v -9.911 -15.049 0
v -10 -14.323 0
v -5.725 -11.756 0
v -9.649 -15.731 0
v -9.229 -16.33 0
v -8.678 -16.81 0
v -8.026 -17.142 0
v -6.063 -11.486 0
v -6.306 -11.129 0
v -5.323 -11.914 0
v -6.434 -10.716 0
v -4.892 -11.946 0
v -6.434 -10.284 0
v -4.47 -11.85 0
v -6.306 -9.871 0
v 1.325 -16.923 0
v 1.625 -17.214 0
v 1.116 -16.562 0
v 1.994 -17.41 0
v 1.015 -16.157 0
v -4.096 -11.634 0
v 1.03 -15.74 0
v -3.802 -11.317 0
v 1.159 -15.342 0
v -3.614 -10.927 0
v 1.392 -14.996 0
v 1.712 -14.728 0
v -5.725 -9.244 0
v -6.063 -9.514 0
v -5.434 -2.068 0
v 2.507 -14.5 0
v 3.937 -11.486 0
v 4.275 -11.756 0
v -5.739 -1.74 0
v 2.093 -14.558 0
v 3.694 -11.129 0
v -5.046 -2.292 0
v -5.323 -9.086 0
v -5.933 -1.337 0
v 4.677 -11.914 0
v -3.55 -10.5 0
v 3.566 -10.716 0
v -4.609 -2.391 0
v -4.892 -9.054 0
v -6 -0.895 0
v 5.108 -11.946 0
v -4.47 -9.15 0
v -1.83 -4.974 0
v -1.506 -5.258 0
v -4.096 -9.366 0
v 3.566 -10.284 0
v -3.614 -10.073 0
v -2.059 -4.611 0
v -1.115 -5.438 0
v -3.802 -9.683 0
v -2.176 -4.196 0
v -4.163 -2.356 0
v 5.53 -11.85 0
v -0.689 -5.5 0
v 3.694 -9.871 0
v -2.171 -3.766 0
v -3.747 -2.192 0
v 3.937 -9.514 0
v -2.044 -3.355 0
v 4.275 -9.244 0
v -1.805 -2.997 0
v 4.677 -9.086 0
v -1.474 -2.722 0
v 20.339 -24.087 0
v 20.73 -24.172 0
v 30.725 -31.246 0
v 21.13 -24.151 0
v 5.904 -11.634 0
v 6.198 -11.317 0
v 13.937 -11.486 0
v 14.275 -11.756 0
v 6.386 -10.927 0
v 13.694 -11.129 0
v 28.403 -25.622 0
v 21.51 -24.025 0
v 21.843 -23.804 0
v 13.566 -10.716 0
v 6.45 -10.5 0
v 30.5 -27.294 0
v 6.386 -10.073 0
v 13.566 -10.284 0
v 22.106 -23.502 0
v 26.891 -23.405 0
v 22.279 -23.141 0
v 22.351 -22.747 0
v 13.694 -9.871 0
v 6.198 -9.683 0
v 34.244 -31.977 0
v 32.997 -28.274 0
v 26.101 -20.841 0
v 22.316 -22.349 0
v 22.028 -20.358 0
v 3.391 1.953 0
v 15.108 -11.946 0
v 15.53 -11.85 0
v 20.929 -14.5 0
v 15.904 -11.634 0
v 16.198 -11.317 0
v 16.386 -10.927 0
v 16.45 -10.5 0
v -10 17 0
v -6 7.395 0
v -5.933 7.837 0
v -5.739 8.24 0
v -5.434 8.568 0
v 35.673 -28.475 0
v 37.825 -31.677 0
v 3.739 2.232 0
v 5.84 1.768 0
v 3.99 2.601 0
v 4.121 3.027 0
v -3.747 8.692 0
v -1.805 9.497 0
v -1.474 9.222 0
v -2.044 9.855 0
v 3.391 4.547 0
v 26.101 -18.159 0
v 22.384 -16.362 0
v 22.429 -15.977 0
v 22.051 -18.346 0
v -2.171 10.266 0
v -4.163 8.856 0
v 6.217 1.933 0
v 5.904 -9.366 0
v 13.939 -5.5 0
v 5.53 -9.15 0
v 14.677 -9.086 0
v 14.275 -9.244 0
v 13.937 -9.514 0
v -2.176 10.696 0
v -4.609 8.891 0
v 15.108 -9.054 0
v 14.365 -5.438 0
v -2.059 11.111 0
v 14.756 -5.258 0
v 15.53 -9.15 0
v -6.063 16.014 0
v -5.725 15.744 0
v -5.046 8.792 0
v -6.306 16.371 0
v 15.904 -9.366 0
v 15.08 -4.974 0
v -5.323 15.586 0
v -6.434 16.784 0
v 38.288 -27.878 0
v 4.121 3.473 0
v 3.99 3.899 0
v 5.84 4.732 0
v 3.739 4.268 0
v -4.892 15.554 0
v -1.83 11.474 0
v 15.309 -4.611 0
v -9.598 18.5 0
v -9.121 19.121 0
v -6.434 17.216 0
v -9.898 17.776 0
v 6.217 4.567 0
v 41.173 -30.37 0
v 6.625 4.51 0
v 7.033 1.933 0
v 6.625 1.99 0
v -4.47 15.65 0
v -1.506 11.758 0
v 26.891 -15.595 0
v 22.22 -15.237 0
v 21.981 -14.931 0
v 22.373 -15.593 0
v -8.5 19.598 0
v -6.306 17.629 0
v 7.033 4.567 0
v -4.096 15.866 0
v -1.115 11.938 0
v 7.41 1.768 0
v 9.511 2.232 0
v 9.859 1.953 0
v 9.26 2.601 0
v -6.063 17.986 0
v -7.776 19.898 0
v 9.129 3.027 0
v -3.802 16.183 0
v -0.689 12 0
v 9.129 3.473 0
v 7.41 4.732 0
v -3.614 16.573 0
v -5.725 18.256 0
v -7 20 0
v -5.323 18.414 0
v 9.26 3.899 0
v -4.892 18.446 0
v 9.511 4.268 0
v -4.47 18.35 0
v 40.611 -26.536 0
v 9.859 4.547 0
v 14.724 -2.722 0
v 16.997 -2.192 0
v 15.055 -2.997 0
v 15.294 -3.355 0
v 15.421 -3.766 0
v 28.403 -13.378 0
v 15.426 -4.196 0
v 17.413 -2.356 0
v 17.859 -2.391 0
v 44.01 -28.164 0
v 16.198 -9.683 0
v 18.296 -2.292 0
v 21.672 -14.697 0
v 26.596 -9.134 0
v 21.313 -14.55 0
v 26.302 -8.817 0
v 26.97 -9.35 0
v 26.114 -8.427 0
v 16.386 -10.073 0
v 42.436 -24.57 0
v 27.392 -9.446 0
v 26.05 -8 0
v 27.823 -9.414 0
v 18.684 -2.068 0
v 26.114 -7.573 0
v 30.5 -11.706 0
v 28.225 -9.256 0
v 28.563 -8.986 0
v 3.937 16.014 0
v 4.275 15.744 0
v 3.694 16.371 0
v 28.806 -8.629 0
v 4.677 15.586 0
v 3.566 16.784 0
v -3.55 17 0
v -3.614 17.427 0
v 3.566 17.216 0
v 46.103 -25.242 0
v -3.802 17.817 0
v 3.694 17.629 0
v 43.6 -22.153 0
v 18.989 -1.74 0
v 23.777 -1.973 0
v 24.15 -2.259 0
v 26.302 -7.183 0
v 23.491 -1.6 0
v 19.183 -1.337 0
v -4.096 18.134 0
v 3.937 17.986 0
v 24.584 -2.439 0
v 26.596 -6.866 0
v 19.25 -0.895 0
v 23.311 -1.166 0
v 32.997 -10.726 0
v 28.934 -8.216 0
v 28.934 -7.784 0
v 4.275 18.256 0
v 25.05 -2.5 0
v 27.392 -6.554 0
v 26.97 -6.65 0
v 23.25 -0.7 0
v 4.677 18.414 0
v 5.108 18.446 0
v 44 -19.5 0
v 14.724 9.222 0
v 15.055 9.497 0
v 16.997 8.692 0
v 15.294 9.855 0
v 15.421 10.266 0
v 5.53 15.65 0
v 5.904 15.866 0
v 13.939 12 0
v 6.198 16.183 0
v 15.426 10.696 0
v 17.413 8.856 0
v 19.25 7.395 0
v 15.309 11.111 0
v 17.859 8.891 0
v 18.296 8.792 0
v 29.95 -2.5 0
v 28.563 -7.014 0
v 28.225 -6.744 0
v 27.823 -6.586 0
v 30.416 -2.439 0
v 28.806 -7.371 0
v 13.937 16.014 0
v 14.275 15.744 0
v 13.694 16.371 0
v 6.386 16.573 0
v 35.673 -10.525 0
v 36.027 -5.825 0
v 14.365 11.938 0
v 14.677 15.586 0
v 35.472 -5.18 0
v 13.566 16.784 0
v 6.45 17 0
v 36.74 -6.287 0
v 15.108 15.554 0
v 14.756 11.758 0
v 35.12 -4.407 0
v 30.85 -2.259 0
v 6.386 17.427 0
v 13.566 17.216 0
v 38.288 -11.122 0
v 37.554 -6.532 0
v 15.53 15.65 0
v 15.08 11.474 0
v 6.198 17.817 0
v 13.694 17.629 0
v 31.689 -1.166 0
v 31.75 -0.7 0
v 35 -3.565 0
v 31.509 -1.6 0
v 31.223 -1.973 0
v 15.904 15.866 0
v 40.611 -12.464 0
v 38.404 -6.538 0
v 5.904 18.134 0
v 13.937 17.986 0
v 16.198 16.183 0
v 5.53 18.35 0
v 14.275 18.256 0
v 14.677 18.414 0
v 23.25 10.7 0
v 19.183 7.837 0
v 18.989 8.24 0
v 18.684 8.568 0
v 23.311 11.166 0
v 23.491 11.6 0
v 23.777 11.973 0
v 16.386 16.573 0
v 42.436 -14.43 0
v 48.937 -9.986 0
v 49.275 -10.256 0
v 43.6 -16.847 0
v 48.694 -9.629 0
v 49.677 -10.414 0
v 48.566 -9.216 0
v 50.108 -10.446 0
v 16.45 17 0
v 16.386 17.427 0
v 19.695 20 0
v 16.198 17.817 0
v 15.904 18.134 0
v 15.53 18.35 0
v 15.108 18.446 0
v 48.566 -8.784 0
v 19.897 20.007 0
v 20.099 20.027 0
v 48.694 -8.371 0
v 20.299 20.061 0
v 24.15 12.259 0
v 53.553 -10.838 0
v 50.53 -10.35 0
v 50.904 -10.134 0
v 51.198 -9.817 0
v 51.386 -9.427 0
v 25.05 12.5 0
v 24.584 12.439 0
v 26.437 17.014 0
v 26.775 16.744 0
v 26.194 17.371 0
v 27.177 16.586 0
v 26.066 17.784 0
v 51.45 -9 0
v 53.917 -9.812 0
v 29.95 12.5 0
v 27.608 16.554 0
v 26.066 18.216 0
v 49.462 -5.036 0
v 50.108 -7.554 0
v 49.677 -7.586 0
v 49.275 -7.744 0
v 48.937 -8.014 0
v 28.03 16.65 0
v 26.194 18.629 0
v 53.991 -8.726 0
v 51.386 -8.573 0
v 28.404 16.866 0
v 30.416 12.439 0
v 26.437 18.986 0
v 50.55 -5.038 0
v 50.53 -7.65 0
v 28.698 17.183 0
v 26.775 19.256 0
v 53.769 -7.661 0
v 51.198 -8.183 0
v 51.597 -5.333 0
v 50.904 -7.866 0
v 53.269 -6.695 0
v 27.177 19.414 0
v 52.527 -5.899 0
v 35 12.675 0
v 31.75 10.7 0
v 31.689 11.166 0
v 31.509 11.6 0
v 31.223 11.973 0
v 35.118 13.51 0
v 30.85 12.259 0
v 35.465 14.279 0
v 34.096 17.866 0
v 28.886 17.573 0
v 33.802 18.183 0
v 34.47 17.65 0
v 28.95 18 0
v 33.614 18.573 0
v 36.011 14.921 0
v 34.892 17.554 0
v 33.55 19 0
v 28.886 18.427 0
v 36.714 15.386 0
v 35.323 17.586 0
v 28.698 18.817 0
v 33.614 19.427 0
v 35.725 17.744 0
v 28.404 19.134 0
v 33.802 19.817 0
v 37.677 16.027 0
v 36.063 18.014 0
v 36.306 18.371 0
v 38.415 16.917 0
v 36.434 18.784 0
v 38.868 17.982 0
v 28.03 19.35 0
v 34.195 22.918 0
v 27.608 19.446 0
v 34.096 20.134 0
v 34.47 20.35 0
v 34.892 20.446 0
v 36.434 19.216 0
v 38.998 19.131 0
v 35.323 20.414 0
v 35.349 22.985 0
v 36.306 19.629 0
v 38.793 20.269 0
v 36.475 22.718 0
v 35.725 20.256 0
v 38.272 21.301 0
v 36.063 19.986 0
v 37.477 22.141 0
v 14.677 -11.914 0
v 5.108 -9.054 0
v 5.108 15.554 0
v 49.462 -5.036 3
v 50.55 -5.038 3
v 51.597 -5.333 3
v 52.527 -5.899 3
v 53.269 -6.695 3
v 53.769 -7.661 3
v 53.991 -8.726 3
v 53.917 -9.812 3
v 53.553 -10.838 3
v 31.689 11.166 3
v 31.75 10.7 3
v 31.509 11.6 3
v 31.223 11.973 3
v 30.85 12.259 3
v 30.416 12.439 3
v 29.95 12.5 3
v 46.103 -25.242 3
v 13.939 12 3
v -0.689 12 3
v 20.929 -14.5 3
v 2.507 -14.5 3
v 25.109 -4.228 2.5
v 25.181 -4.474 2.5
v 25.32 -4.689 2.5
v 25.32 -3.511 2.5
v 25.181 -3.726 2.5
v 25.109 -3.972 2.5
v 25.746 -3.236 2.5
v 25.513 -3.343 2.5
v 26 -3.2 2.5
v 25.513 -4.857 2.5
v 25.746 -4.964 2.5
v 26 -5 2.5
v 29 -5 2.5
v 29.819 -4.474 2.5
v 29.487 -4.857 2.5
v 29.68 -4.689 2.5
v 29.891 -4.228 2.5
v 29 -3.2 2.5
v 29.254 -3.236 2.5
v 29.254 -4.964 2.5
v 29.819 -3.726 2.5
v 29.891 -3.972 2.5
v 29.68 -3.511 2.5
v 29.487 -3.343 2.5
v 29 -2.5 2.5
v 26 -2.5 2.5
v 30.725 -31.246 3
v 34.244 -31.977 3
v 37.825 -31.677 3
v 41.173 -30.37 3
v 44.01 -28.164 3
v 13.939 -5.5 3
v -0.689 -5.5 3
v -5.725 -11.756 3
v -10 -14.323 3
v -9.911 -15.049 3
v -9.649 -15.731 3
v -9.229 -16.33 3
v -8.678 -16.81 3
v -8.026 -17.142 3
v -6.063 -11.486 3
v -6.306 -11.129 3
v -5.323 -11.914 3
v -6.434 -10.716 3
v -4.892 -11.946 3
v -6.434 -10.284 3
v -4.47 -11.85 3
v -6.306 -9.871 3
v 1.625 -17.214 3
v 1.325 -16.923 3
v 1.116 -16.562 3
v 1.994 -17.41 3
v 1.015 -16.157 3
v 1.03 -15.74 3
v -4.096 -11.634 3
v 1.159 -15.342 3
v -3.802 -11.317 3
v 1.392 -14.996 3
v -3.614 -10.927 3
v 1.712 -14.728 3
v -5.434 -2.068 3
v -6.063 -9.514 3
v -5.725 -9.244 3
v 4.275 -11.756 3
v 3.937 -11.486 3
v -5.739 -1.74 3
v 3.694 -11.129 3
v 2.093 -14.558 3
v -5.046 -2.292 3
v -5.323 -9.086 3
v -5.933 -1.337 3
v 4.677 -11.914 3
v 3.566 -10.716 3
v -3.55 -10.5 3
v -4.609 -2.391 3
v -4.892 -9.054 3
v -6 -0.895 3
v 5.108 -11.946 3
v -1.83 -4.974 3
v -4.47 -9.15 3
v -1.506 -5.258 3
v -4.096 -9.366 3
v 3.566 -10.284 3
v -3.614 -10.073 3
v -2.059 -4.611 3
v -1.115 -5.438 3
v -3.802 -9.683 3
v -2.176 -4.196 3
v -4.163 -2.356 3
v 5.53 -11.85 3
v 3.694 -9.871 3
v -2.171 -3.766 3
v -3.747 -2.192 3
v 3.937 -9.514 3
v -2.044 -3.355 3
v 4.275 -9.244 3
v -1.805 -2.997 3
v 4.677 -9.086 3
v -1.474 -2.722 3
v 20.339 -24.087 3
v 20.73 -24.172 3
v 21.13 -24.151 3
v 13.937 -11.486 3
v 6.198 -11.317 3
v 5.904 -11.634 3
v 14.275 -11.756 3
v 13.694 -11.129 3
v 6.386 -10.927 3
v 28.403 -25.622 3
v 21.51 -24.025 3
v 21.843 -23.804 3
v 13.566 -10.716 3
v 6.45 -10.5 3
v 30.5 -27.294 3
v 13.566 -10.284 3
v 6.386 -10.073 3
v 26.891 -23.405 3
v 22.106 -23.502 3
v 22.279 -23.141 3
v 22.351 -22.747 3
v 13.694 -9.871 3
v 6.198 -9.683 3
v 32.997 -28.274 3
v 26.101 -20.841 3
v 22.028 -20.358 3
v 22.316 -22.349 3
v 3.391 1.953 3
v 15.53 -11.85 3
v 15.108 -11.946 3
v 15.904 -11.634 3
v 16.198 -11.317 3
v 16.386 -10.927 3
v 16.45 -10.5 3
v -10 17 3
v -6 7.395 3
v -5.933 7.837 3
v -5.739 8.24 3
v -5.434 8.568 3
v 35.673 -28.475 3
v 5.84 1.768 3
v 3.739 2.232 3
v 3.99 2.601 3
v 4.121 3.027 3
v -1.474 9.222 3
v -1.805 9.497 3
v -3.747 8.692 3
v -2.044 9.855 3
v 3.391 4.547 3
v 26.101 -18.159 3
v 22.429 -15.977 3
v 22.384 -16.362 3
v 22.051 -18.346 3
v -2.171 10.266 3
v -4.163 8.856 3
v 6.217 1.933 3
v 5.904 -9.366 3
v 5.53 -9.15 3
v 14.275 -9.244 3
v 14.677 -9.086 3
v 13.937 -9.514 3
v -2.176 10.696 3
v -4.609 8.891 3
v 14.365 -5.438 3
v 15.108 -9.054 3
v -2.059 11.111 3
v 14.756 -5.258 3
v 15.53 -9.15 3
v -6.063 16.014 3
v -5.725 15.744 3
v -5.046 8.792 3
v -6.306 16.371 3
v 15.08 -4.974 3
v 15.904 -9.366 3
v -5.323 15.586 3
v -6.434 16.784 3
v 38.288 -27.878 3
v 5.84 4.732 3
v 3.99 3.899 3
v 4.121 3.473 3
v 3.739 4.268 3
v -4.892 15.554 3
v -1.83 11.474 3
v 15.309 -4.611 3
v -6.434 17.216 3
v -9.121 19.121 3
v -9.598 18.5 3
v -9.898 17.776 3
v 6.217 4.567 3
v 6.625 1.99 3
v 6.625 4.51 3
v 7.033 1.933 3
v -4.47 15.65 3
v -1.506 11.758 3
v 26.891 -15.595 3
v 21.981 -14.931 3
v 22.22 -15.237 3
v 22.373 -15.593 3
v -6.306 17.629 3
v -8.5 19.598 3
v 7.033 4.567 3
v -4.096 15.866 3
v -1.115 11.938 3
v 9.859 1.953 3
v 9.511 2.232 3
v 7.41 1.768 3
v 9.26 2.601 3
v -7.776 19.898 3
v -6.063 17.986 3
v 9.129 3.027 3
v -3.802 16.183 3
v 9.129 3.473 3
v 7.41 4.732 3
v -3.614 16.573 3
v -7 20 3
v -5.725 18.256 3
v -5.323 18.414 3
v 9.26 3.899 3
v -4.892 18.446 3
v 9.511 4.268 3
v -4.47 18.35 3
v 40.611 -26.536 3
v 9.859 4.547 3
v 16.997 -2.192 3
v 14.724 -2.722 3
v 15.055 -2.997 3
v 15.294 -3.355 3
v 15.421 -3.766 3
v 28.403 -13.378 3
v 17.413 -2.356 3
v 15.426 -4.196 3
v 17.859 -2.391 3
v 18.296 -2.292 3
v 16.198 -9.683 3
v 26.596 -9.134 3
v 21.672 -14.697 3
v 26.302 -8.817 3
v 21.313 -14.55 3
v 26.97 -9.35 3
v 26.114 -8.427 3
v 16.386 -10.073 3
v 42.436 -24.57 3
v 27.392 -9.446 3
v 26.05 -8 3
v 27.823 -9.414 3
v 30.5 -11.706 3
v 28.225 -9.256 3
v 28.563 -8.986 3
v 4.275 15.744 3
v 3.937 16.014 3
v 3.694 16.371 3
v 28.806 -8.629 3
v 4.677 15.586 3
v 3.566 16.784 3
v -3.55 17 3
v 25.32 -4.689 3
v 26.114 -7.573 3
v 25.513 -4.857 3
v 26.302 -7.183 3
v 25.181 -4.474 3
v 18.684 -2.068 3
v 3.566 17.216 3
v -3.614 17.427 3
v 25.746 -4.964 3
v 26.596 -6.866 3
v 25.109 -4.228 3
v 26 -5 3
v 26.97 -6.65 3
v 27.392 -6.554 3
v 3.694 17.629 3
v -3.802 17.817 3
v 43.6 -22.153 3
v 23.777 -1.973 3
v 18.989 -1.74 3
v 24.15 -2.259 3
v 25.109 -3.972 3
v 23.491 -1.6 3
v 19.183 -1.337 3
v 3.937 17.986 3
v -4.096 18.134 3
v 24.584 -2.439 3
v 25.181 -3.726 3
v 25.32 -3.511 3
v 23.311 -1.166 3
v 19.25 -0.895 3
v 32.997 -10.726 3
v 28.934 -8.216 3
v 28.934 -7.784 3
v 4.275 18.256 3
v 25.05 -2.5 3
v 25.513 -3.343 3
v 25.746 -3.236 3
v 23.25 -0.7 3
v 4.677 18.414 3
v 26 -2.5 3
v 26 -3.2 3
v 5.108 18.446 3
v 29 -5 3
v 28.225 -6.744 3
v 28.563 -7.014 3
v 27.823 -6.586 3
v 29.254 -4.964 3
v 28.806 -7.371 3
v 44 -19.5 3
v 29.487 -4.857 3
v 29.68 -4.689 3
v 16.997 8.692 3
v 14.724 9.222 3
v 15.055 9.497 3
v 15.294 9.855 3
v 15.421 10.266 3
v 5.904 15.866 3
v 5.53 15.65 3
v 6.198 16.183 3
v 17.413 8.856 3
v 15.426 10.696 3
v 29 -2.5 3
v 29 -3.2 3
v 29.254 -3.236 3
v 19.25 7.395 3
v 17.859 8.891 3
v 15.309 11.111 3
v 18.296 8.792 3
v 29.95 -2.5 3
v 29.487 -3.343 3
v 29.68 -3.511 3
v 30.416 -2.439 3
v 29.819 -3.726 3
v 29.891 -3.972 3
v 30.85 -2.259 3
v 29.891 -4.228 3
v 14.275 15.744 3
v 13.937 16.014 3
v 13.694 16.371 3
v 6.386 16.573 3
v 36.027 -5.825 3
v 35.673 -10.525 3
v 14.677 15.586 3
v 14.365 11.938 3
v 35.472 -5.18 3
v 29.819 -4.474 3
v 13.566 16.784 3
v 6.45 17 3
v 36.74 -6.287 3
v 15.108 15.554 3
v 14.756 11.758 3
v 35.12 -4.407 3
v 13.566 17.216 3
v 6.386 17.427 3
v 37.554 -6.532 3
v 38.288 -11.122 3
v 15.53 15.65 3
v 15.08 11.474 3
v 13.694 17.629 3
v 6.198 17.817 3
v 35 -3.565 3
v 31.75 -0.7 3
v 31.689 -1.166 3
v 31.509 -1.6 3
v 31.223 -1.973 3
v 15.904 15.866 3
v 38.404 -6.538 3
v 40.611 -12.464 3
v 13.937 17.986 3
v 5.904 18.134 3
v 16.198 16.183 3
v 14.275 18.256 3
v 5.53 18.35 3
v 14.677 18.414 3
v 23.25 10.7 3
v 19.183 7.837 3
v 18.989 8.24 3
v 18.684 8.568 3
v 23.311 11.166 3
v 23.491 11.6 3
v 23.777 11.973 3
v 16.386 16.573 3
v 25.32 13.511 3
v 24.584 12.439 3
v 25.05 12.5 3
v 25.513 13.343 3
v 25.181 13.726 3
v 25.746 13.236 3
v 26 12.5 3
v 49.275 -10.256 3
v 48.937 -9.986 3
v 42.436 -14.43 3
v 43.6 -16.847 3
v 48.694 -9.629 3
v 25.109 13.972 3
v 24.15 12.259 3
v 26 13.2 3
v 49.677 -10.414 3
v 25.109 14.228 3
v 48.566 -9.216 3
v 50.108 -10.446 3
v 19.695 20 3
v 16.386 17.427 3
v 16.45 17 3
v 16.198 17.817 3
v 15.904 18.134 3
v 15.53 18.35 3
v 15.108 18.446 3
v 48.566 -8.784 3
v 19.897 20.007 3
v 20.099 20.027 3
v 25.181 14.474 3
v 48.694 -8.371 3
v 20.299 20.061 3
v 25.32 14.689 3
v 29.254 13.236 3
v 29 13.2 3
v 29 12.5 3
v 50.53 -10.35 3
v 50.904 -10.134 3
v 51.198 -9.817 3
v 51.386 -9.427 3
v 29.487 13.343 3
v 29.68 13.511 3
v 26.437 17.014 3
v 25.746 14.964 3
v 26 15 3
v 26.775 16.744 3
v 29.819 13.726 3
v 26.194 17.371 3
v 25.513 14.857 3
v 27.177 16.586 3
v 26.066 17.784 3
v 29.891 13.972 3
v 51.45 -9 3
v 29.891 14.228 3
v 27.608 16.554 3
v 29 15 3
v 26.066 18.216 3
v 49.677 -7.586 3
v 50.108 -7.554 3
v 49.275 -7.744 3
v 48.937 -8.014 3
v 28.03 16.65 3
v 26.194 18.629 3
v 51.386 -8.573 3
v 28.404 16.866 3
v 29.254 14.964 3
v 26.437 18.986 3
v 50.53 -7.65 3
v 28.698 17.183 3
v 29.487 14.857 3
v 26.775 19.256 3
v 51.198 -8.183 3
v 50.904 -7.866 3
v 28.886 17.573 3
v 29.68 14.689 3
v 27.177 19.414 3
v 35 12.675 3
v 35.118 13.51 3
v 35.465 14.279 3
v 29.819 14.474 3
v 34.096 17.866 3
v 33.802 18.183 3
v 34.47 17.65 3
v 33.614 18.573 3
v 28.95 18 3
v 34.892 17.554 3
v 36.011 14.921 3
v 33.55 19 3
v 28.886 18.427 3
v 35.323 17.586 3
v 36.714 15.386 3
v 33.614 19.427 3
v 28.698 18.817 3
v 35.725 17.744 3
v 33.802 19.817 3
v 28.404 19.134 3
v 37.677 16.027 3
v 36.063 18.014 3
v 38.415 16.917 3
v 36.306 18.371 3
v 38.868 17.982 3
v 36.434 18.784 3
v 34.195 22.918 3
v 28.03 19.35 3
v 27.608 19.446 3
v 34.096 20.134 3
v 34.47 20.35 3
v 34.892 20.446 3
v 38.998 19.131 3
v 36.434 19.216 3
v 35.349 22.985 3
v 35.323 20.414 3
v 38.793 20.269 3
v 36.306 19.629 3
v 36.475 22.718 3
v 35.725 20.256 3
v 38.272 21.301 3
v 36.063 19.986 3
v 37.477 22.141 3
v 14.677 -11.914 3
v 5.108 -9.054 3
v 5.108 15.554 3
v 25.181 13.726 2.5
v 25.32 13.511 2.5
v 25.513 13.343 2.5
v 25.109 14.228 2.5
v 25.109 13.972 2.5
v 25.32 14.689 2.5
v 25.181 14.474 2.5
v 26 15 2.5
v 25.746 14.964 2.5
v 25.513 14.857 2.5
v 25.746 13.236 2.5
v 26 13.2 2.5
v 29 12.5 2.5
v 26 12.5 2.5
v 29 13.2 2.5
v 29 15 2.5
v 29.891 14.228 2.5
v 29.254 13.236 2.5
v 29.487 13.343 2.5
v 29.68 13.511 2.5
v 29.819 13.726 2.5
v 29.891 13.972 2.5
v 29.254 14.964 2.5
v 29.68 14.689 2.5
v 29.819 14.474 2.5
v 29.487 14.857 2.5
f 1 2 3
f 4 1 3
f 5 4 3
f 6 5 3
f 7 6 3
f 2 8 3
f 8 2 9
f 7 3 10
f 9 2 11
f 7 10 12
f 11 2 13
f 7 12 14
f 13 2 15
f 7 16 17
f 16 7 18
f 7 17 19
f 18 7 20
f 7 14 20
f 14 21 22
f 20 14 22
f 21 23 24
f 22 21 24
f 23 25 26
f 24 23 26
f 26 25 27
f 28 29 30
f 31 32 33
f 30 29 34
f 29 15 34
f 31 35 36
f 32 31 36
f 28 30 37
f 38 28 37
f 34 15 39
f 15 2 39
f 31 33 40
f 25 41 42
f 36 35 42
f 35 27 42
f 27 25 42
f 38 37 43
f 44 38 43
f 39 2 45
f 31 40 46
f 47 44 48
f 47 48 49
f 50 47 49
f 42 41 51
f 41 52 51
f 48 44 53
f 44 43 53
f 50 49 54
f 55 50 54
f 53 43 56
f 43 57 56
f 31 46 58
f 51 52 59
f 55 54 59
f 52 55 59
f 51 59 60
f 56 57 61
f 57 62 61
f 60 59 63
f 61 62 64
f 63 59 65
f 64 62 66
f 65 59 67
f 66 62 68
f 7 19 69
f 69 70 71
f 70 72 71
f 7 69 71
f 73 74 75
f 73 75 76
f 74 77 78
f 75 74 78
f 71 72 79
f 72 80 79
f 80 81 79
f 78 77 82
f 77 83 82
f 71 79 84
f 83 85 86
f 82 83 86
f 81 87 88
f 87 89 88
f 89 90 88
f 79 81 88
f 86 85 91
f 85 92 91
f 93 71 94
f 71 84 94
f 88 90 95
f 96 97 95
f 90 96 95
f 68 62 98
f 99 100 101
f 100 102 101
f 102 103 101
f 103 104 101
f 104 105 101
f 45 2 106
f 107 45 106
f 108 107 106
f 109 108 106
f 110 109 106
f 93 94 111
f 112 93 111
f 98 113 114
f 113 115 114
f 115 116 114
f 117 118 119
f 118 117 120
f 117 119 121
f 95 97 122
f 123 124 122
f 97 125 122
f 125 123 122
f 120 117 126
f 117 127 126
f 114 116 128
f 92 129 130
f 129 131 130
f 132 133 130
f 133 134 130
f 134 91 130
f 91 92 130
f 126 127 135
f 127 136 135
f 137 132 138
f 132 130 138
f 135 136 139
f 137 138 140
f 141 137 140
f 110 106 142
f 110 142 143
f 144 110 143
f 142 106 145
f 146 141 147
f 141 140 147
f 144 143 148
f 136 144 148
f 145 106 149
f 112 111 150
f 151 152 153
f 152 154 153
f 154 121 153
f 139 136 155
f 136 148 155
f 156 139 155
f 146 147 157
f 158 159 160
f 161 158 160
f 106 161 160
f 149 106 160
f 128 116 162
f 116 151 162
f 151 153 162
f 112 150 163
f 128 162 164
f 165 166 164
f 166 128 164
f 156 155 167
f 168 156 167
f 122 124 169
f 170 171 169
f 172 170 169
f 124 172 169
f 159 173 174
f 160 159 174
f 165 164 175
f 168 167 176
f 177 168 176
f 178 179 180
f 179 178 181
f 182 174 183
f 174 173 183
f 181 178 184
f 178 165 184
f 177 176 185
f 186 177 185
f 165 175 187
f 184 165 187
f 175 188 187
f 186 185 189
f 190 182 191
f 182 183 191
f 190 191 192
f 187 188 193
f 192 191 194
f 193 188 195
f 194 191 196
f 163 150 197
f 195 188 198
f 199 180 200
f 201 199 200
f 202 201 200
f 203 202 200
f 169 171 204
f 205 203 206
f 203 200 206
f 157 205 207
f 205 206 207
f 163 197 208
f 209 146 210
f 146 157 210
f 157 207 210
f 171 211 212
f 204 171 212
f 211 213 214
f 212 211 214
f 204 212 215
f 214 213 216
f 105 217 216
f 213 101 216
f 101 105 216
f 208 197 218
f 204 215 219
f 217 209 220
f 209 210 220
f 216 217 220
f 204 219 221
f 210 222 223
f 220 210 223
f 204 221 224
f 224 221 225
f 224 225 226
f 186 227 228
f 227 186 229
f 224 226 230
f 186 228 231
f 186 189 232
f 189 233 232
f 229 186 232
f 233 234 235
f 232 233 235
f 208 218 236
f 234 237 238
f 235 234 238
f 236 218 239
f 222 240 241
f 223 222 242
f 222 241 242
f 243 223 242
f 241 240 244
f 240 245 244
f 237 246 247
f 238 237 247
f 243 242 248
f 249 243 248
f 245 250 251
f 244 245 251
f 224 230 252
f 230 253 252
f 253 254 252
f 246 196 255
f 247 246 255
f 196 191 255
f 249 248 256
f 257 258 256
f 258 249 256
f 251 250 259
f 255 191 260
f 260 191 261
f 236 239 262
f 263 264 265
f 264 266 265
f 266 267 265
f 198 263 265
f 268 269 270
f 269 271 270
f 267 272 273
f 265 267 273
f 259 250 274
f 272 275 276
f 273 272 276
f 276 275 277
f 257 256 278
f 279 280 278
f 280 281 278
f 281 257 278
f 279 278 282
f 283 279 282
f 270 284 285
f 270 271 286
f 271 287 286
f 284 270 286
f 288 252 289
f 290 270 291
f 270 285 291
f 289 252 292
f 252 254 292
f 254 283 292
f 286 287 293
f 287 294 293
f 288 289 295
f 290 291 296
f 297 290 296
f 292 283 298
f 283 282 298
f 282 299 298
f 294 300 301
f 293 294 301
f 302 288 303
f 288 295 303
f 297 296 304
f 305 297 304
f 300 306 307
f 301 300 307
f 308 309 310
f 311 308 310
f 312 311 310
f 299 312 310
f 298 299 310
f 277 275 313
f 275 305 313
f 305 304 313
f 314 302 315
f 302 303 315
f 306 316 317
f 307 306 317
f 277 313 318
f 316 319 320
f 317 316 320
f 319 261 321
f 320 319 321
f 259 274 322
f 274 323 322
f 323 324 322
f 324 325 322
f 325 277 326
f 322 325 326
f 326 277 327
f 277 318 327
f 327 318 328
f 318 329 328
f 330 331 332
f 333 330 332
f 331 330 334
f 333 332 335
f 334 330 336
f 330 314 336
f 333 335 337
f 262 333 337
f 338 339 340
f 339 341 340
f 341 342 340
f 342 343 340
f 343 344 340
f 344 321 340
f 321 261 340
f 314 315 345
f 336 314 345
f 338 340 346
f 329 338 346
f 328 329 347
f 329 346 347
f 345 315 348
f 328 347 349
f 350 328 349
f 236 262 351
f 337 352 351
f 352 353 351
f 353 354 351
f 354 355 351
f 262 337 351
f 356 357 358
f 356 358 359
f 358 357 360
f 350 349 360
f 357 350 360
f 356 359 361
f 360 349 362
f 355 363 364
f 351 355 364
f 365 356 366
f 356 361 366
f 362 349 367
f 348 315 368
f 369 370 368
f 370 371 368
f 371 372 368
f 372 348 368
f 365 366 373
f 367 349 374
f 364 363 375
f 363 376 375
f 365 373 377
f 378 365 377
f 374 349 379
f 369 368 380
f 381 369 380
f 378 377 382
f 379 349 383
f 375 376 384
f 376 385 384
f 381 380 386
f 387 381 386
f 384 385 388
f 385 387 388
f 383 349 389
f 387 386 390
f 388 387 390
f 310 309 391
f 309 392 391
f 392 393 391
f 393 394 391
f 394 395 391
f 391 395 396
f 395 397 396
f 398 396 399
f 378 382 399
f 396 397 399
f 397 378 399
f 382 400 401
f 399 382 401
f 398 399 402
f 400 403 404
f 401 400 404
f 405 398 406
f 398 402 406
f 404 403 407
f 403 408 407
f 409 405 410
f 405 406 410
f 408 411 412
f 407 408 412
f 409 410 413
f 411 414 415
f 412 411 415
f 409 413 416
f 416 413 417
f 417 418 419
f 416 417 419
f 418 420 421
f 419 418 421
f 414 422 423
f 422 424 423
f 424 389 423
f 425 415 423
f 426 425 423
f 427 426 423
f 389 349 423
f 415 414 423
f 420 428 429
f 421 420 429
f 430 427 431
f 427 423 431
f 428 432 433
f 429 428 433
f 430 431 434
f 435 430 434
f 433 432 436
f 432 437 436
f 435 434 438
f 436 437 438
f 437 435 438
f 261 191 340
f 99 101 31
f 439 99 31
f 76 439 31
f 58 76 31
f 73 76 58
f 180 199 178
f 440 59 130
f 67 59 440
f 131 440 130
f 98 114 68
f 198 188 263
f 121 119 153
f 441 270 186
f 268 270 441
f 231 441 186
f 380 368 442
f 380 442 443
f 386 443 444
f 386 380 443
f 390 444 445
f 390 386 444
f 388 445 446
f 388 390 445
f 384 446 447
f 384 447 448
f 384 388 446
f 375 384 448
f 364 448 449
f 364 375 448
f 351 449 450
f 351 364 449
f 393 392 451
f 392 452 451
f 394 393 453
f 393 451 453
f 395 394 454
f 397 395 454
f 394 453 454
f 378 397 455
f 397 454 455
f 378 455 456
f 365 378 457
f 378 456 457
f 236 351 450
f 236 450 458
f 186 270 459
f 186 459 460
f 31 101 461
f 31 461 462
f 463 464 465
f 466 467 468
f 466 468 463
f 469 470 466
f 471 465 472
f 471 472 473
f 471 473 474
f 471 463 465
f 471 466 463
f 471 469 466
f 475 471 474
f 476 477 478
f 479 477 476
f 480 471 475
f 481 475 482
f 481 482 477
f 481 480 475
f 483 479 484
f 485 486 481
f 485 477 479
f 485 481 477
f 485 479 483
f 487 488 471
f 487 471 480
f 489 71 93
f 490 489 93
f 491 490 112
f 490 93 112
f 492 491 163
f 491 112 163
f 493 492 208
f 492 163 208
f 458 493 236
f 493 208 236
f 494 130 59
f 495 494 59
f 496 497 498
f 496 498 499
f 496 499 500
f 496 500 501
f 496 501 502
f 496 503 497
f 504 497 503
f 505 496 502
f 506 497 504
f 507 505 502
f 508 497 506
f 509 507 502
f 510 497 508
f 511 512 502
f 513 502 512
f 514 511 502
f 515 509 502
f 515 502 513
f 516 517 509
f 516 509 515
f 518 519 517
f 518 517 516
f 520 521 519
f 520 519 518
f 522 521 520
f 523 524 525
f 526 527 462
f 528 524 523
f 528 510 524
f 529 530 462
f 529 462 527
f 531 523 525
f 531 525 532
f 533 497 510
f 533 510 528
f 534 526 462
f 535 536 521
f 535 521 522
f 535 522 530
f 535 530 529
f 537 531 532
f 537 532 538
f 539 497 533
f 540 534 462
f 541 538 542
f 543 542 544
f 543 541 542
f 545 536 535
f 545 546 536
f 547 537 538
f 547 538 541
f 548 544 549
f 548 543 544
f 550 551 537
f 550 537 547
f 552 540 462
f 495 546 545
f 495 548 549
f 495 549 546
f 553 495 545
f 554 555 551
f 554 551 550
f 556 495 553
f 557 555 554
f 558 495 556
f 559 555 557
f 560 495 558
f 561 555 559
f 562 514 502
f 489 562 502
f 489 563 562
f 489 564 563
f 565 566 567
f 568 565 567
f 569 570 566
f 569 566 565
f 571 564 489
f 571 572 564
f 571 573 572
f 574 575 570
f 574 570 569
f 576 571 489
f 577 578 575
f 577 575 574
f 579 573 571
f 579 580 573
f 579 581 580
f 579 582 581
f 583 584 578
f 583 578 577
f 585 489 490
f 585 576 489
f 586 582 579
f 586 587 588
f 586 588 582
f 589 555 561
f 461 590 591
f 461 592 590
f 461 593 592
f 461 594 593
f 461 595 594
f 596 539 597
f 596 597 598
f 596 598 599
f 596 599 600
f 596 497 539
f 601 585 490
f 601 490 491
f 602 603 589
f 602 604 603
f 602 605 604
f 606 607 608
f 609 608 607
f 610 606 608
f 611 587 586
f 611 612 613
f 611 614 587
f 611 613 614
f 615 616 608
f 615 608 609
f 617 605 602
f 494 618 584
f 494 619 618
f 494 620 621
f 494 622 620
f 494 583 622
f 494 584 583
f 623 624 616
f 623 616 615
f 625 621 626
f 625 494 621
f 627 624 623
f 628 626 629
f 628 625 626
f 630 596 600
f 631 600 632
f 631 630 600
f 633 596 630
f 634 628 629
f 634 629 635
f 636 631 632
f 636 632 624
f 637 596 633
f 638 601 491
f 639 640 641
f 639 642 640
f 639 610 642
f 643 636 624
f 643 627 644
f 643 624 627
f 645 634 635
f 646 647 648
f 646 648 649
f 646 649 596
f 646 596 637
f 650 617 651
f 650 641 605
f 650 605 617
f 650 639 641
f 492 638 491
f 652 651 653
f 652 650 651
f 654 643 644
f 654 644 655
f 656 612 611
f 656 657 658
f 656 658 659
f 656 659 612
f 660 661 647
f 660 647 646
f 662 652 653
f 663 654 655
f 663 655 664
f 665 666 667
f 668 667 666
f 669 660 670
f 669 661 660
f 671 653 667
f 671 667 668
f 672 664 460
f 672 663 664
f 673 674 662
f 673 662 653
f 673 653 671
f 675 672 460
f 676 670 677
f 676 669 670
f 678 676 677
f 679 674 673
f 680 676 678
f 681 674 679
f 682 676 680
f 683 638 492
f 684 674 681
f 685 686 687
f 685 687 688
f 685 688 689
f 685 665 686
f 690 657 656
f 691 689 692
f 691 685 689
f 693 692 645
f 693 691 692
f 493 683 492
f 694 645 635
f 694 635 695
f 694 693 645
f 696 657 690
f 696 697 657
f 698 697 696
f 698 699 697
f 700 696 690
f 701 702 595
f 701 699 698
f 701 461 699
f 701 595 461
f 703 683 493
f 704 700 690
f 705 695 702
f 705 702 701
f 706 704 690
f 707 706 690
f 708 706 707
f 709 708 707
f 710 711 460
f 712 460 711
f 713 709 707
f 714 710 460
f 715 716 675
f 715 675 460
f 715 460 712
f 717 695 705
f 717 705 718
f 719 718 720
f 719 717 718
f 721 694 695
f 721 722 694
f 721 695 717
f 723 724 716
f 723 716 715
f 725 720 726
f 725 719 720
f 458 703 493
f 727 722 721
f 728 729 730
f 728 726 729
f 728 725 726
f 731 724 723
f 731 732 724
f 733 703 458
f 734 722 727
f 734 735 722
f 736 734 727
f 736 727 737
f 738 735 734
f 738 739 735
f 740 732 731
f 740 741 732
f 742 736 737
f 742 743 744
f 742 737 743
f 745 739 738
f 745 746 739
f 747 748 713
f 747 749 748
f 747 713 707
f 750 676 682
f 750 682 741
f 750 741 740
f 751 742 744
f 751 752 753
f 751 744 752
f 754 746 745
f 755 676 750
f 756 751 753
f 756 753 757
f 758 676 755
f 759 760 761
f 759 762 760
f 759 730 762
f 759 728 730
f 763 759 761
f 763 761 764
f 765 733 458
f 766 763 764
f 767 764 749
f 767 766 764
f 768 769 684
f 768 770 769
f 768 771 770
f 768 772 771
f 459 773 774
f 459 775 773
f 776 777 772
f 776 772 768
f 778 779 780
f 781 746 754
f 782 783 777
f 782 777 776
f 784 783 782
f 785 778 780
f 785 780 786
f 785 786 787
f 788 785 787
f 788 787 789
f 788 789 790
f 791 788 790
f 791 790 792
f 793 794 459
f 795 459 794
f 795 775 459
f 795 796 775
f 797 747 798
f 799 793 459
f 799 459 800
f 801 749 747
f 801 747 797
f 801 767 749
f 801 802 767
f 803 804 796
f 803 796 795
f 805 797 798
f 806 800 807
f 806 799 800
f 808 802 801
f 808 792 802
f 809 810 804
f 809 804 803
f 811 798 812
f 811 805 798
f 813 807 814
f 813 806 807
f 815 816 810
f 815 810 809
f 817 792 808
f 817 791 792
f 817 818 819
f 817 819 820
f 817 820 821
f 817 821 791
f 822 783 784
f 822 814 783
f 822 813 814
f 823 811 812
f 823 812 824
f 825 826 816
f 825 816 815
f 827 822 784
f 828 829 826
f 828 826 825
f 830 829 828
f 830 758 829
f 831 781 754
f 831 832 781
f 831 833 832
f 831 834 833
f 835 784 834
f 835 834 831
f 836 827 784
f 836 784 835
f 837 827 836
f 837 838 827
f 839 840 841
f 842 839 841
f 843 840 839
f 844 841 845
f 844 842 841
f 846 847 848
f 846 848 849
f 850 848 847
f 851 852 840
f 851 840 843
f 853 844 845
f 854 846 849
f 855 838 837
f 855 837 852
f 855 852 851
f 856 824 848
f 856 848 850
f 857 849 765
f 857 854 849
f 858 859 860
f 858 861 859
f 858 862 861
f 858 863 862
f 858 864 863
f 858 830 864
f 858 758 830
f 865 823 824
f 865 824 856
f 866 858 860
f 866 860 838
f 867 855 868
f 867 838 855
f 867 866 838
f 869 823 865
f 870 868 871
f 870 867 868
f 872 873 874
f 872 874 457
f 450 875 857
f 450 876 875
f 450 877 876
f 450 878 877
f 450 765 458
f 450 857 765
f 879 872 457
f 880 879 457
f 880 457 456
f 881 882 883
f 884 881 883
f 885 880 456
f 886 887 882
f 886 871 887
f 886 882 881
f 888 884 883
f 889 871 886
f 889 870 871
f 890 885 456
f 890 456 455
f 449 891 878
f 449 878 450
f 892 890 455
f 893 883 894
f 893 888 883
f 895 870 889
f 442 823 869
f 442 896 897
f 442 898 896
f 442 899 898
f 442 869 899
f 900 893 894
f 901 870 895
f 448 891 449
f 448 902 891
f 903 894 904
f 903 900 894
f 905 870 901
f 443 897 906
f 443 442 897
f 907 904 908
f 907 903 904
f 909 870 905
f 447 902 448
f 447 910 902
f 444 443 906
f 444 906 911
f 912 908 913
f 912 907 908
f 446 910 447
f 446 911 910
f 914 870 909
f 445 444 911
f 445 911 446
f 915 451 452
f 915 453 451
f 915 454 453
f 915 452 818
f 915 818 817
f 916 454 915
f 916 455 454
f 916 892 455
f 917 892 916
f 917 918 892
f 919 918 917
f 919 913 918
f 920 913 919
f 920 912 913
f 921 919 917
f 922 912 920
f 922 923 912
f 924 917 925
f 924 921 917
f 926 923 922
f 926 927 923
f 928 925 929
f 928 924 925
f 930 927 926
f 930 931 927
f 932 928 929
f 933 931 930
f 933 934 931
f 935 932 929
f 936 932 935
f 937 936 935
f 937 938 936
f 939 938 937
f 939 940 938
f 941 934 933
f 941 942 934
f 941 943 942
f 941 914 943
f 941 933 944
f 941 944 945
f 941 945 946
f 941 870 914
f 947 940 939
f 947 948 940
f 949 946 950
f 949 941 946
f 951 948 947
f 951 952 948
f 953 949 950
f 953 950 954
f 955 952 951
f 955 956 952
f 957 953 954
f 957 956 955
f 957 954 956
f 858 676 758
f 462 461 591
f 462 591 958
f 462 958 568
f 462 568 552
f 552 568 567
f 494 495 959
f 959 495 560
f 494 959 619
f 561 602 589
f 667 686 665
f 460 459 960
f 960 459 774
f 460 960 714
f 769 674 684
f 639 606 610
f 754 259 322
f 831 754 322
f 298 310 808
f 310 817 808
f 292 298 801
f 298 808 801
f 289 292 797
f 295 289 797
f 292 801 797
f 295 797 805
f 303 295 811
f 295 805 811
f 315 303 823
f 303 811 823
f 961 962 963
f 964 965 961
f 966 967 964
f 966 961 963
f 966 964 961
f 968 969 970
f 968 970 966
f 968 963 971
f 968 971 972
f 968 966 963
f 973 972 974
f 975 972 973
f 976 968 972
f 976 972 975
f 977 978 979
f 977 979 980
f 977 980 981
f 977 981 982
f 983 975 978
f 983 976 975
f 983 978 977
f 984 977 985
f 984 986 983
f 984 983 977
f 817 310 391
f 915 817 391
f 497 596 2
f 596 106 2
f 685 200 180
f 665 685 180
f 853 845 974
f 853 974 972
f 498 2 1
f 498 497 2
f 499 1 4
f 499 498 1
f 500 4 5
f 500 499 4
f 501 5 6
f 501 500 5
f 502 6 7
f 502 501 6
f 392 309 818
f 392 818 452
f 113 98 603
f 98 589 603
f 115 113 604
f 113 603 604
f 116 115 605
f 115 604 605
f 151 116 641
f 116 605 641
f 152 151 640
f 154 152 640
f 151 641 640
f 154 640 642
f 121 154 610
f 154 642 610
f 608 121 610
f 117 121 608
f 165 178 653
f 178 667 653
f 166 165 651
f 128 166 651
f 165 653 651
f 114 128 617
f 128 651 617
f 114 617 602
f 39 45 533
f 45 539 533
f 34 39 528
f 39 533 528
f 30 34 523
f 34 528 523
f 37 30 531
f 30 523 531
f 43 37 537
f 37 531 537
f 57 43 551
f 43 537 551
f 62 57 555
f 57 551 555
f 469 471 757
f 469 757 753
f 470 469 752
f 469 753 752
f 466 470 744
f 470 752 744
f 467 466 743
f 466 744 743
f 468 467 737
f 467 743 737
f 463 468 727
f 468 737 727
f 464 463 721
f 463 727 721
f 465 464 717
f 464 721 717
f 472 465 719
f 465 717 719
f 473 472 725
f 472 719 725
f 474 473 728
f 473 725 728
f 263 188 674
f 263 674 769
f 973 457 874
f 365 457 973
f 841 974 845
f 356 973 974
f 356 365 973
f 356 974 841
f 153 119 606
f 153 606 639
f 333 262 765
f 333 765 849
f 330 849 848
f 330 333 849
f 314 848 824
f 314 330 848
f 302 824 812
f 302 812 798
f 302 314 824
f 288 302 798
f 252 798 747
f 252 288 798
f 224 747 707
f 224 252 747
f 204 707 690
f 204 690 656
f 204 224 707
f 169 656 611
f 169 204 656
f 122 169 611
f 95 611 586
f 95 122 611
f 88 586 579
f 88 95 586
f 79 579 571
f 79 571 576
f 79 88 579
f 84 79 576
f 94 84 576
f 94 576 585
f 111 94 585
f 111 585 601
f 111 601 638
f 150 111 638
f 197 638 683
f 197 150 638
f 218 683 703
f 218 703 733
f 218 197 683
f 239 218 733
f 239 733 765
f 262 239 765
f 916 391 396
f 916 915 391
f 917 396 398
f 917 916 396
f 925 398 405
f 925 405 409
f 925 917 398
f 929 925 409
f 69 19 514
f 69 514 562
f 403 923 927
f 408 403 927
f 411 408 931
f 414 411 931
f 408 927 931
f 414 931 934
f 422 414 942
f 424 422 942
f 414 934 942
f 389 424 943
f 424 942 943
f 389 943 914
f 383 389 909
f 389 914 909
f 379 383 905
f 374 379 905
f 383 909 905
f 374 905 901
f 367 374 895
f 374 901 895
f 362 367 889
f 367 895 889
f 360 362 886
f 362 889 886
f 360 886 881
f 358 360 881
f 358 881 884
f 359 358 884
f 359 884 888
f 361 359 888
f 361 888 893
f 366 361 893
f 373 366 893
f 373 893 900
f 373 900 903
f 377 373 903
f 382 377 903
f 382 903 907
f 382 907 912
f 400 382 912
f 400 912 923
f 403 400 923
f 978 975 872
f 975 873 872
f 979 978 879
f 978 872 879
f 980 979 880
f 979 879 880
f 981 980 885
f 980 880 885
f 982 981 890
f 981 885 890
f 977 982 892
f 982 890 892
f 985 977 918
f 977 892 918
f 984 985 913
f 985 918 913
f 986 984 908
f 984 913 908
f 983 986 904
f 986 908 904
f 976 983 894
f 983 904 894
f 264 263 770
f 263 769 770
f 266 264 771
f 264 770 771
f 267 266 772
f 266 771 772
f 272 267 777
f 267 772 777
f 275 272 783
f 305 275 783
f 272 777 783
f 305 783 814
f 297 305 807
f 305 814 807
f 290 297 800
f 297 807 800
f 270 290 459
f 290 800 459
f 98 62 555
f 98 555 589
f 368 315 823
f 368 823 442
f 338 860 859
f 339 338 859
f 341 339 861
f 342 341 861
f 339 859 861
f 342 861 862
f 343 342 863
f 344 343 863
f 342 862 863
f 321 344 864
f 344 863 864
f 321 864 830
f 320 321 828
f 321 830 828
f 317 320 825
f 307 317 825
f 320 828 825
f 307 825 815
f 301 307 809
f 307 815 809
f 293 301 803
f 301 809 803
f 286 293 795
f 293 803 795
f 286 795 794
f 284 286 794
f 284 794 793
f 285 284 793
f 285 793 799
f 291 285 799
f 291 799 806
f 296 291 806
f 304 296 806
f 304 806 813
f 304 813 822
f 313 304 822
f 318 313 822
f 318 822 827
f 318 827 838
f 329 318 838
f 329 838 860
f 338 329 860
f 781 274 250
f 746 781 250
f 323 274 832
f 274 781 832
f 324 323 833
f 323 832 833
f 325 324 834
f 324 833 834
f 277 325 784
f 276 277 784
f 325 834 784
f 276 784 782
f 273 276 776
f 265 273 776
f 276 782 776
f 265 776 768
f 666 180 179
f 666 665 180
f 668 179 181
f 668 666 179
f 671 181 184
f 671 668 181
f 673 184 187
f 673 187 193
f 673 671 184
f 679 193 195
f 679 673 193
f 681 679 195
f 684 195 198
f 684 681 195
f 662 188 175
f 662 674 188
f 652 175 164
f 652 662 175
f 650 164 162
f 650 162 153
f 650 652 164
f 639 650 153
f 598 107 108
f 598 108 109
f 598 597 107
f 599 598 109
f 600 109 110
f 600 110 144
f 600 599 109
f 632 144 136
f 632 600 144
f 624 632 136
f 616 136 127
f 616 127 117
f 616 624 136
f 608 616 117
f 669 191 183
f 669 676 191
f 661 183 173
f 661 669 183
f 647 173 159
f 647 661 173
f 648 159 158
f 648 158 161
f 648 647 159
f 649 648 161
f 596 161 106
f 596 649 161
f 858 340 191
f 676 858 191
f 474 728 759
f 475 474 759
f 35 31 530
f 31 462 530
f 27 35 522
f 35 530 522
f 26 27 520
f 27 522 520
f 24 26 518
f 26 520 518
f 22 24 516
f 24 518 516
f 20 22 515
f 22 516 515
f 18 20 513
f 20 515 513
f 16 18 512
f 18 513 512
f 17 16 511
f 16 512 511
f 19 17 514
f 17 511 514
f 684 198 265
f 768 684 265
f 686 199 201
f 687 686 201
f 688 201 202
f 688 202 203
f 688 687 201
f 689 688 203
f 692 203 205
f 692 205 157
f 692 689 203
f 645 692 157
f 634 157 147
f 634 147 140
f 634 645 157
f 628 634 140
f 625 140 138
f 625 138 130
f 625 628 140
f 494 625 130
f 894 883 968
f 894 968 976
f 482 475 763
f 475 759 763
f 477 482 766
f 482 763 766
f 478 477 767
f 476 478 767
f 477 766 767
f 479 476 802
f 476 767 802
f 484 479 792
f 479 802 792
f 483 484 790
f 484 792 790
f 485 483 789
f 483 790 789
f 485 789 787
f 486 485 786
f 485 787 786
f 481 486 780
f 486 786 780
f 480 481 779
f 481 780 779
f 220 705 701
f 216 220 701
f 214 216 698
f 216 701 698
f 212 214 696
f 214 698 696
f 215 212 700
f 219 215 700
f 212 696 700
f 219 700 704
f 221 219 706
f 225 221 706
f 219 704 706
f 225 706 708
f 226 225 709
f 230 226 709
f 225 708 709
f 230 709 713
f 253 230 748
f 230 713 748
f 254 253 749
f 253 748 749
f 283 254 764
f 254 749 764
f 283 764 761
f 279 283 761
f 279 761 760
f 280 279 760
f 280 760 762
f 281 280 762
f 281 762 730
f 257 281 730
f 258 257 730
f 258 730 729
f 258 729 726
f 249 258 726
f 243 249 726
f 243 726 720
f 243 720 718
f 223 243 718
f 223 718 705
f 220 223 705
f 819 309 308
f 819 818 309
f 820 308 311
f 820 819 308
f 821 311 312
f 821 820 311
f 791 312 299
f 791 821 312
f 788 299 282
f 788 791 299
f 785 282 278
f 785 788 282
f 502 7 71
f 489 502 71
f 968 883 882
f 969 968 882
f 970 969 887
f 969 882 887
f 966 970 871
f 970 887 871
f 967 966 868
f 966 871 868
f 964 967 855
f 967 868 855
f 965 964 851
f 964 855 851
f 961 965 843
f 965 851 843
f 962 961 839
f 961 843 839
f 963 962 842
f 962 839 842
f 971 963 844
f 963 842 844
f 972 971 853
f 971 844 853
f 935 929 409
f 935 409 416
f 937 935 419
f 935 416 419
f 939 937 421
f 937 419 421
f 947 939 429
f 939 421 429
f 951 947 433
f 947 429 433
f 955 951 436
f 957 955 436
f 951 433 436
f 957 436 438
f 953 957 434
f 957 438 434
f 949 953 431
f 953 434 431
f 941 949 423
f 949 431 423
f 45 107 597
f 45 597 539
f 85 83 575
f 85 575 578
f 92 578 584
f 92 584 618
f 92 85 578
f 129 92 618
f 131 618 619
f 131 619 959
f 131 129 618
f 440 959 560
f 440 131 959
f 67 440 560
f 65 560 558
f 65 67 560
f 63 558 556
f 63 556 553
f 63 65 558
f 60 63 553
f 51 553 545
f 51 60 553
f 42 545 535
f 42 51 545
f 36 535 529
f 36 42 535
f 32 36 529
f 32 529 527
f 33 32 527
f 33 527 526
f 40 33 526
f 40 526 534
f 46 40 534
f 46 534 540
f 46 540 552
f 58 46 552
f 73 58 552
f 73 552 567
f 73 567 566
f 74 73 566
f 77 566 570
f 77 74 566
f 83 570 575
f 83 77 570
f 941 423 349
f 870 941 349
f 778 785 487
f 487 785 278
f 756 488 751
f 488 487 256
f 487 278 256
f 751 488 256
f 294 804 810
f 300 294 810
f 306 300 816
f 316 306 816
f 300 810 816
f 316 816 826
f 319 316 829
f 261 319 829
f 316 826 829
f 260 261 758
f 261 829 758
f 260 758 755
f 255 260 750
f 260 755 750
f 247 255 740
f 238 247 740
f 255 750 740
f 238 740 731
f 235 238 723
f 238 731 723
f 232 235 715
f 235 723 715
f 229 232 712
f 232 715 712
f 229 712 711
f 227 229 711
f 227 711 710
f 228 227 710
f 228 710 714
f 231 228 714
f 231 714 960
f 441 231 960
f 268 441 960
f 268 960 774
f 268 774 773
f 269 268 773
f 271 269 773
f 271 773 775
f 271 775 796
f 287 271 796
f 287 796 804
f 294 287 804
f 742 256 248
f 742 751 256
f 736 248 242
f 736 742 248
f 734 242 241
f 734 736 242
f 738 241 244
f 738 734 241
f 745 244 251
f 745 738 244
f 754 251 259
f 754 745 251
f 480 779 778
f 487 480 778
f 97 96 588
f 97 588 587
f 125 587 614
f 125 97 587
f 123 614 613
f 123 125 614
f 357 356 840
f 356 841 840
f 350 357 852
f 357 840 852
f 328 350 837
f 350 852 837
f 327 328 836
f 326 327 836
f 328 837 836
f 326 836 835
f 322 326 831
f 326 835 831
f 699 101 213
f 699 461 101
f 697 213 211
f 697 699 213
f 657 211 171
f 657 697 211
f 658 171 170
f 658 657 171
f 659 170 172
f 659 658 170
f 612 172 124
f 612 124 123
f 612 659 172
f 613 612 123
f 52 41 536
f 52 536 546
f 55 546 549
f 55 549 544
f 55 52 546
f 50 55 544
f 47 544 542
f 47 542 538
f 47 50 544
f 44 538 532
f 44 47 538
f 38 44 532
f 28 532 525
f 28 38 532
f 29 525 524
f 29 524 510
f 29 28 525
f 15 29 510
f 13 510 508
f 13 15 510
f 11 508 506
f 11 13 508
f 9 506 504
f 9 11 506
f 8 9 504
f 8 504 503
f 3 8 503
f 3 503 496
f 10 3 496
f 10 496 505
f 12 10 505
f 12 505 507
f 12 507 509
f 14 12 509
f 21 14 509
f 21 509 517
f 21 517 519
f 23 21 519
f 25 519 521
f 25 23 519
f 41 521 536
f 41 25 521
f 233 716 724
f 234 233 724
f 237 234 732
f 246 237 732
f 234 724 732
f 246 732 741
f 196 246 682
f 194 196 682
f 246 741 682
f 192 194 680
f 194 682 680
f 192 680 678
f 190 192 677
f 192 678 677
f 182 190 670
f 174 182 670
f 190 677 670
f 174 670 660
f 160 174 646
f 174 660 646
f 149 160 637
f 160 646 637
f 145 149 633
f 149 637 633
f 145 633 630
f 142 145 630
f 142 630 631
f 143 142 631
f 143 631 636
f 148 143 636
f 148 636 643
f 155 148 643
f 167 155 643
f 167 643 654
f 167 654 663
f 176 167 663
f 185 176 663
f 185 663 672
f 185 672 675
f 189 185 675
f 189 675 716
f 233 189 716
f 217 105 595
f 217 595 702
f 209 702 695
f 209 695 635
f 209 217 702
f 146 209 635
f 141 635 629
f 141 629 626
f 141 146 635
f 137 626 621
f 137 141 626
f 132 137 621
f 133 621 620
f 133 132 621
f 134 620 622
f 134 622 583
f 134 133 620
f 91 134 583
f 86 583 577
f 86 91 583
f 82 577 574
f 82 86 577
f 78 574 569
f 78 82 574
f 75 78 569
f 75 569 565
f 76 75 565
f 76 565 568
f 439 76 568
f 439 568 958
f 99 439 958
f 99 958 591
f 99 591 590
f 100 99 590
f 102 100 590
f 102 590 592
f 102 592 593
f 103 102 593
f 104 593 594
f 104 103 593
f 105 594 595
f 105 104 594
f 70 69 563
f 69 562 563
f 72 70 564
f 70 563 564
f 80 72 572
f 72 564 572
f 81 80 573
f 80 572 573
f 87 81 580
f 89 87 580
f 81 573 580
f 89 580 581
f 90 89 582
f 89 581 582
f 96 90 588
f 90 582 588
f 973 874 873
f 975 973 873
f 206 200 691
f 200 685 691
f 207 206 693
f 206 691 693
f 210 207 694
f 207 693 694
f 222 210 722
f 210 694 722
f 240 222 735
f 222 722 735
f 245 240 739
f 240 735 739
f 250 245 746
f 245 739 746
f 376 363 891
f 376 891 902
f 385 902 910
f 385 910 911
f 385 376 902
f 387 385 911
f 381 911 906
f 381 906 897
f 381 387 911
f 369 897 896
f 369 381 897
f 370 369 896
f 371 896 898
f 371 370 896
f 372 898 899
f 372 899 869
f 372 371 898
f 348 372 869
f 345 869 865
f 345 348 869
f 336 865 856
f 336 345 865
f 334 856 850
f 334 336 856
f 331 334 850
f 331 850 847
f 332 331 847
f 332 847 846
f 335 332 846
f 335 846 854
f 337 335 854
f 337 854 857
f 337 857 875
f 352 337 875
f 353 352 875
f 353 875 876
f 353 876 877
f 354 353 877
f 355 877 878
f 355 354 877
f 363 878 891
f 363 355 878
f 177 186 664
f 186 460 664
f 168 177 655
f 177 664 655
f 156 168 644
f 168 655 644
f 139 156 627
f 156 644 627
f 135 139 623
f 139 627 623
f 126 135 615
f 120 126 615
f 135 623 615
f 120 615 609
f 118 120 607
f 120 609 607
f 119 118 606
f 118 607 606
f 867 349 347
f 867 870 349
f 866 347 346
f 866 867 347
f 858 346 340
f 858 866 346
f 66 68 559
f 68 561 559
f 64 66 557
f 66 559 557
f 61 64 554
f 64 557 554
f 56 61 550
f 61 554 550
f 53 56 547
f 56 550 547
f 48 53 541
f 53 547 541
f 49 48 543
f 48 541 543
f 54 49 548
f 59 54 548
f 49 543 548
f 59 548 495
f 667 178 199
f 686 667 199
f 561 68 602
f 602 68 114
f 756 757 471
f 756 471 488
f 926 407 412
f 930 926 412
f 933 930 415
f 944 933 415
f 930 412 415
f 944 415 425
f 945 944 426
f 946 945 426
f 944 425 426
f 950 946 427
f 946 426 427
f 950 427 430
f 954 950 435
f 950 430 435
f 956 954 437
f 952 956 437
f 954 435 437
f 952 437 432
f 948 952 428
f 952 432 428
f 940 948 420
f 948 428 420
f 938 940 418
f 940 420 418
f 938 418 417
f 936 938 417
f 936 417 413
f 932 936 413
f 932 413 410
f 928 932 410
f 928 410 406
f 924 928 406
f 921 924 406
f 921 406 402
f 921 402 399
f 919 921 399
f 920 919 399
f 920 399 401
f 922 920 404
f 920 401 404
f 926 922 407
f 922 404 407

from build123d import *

# Parameters (mm, degrees)
SKETCH_2_R          = 9
SKETCH_2_R_2        = 1.45
EXTRUDE_1_DEPTH     = 3
EXTRUDE_START       = -3
SKETCH_4_R          = 1.45
EXTRUDE_2_DEPTH     = 3
SKETCH_5_R          = 1.45
SKETCH_5_W          = 8.5
SKETCH_5_H          = 15
EXTRUDE_3_DEPTH     = 3
SKETCH_6_W          = 3
SKETCH_6_H          = 20
CUT_EXTRUDE_2_DEPTH = 0.5
SKETCH_7_R          = 1.45
CUT_EXTRUDE_3_DEPTH = 20
FILLET_1_R          = 1.8
FILLET_2_R          = 3
SKETCH_8_R          = 0.9
CUT_EXTRUDE_4_DEPTH = 0.5
CUT_EXTRUDE_5_DEPTH = 10.5
FILLET_3_R          = 1.5


with BuildPart() as part:
    # 草图2 → 凸台-拉伸1 (new body)
    with BuildSketch(Plane.XY):
        with BuildLine():
            Line((-10, -7), (-10, -16.423561614))
            Line((-10, -16.423561614), (30.724748208, -31.24615776))
            ThreePointArc((30.724748208, -31.24615776), (47.310096913, -21.670602221), (35, -7))
            Line((35, -7), (-10, -7))
        make_face()
        with Locations((35, -19.5)):
            Circle(SKETCH_2_R, mode=Mode.SUBTRACT)
        with Locations((15, -10.5)):
            Circle(SKETCH_2_R_2, mode=Mode.SUBTRACT)
        with Locations((5, -10.5)):
            Circle(SKETCH_2_R_2, mode=Mode.SUBTRACT)
        with Locations((-5, -10.5)):
            Circle(SKETCH_2_R_2, mode=Mode.SUBTRACT)
    extrude(amount=EXTRUDE_1_DEPTH)

    # 草图4 → 凸台-拉伸2 (add)
    with BuildSketch(Plane.XY.offset(3).offset(EXTRUDE_START)):
        with BuildLine():
            Line((35, -7), (49.461817276, -5.036370432))
            ThreePointArc((49.461817276, -5.036370432), (53.268884157, -6.694702543), (53.552947171, -10.837543578))
            Line((53.552947171, -10.837543578), (46.102959909, -25.24232368))
            ThreePointArc((46.102959909, -25.24232368), (45.677758332, -13.00111725), (35, -7))
        make_face()
        with Locations((50, -9)):
            Circle(SKETCH_4_R, mode=Mode.SUBTRACT)
    extrude(amount=EXTRUDE_2_DEPTH)

    # 草图5 → 凸台-拉伸3 (add)
    with BuildSketch(Plane(origin=(0, 0, 0), x_dir=(-1, 0, 0), z_dir=(0, 0, -1))):
        with BuildLine():
            Line((-35, -7), (-35, 15))
            ThreePointArc((-35, 15), (-38.979463437, 19.404809528), (-34.194537642, 22.918064623))
            Line((-34.194537642, 22.918064623), (-20, 20))
            Line((-20, 20), (10, 20))
            Line((10, 20), (10, -7))
            Line((10, -7), (-35, -7))
        make_face()
        with Locations((-35, 19)):
            Circle(SKETCH_5_R, mode=Mode.SUBTRACT)
        with Locations((-27.5, 5)):
            Rectangle(SKETCH_5_W, SKETCH_5_H, mode=Mode.SUBTRACT)
    extrude(amount=-EXTRUDE_3_DEPTH)

    # 草图6 → 切除-拉伸2 (cut)
    with BuildSketch(Plane.XY.offset(3)):
        with Locations((27.5, 5)):
            Rectangle(SKETCH_6_W, SKETCH_6_H)
    extrude(amount=-CUT_EXTRUDE_2_DEPTH, mode=Mode.SUBTRACT)

    # 草图7 → 切除-拉伸3 (cut)
    with BuildSketch(Plane.XY.offset(3)):
        with Locations((27.5, 18)):
            Circle(SKETCH_7_R)
        with Locations(Location((27.5, -8, 0), (0, 0, 180))):
            Circle(SKETCH_7_R)
        with Locations((-5, 17)):
            Circle(SKETCH_7_R)
        with Locations((5, 17)):
            Circle(SKETCH_7_R)
        with Locations((15, 17)):
            Circle(SKETCH_7_R)
    extrude(amount=-CUT_EXTRUDE_3_DEPTH, mode=Mode.SUBTRACT)

    # 圆角1
    fillet_1_edges = [part.edges().sort_by_distance(p)[0] for p in [
        (31.75, 12.5, 1.5),
        (23.25, 12.5, 1.5),
        (23.25, -2.5, 1.5),
        (31.75, -2.5, 1.5),
    ]]
    fillet(fillet_1_edges, radius=FILLET_1_R)

    # 圆角2
    fillet_2_edges = [part.edges().sort_by_distance(p)[0] for p in [
        (35, 15, 1.5),
        (20, 20, 1.5),
        (-10, 20, 1.5),
        (35, -7, 1.5),
        (-10, -16.423561614, 1.5),
    ]]
    fillet(fillet_2_edges, radius=FILLET_2_R)

    # 草图8 → 切除-拉伸4 (cut)
    with BuildSketch(Plane.XY.offset(3)):
        with Locations((26, 14.1)):
            Circle(SKETCH_8_R)
        with Locations((29, 14.1)):
            Circle(SKETCH_8_R)
        with Locations((26, -4.1)):
            Circle(SKETCH_8_R)
        with Locations((29, -4.1)):
            Circle(SKETCH_8_R)
    extrude(amount=-CUT_EXTRUDE_4_DEPTH, mode=Mode.SUBTRACT)

    # 草图9 → 切除-拉伸5 (cut)
    with BuildSketch(Plane(origin=(0, 0, 0), x_dir=(-1, 0, 0), z_dir=(0, 0, -1))):
        Polygon((-6.625, 4.25), (-19.25, 12), (6, 12), align=None)
        Polygon((-7.625, 3.25), (-19.25, 10), (-19.25, -3.5), align=None)
        Polygon((6, 10), (6, -3.5), (-5.625, 3.25), align=None)
        Polygon((-19.25, -5.5), (6, -5.5), (-6.625, 2.25), align=None)
        with BuildLine():
            Line((-23, -14.5), (6, -14.5))
            Line((6, -14.5), (-23.298682976, -25.163848506))
            ThreePointArc((-23.298682976, -25.163848506), (-22.005096252, -19.863973337), (-23, -14.5))
        make_face()
    extrude(amount=-CUT_EXTRUDE_5_DEPTH, mode=Mode.SUBTRACT)

    # 圆角3
    fillet_3_edges = [part.edges().sort_by_distance(p)[0] for p in [
        (7.625, 3.25, 1.5),
        (19.25, -3.5, 1.5),
        (19.25, 10, 1.5),
        (23.298682976, -25.163848506, 1.5),
        (23, -14.5, 1.5),
        (-6, -14.5, 1.5),
        (19.25, -5.5, 1.5),
        (6.625, 2.25, 1.5),
        (-6, -5.5, 1.5),
        (5.625, 3.25, 1.5),
        (-6, 10, 1.5),
        (-6, -3.5, 1.5),
        (-6, 12, 1.5),
        (6.625, 4.25, 1.5),
        (19.25, 12, 1.5),
    ]]
    fillet(fillet_3_edges, radius=FILLET_3_R)


solid = part.part
